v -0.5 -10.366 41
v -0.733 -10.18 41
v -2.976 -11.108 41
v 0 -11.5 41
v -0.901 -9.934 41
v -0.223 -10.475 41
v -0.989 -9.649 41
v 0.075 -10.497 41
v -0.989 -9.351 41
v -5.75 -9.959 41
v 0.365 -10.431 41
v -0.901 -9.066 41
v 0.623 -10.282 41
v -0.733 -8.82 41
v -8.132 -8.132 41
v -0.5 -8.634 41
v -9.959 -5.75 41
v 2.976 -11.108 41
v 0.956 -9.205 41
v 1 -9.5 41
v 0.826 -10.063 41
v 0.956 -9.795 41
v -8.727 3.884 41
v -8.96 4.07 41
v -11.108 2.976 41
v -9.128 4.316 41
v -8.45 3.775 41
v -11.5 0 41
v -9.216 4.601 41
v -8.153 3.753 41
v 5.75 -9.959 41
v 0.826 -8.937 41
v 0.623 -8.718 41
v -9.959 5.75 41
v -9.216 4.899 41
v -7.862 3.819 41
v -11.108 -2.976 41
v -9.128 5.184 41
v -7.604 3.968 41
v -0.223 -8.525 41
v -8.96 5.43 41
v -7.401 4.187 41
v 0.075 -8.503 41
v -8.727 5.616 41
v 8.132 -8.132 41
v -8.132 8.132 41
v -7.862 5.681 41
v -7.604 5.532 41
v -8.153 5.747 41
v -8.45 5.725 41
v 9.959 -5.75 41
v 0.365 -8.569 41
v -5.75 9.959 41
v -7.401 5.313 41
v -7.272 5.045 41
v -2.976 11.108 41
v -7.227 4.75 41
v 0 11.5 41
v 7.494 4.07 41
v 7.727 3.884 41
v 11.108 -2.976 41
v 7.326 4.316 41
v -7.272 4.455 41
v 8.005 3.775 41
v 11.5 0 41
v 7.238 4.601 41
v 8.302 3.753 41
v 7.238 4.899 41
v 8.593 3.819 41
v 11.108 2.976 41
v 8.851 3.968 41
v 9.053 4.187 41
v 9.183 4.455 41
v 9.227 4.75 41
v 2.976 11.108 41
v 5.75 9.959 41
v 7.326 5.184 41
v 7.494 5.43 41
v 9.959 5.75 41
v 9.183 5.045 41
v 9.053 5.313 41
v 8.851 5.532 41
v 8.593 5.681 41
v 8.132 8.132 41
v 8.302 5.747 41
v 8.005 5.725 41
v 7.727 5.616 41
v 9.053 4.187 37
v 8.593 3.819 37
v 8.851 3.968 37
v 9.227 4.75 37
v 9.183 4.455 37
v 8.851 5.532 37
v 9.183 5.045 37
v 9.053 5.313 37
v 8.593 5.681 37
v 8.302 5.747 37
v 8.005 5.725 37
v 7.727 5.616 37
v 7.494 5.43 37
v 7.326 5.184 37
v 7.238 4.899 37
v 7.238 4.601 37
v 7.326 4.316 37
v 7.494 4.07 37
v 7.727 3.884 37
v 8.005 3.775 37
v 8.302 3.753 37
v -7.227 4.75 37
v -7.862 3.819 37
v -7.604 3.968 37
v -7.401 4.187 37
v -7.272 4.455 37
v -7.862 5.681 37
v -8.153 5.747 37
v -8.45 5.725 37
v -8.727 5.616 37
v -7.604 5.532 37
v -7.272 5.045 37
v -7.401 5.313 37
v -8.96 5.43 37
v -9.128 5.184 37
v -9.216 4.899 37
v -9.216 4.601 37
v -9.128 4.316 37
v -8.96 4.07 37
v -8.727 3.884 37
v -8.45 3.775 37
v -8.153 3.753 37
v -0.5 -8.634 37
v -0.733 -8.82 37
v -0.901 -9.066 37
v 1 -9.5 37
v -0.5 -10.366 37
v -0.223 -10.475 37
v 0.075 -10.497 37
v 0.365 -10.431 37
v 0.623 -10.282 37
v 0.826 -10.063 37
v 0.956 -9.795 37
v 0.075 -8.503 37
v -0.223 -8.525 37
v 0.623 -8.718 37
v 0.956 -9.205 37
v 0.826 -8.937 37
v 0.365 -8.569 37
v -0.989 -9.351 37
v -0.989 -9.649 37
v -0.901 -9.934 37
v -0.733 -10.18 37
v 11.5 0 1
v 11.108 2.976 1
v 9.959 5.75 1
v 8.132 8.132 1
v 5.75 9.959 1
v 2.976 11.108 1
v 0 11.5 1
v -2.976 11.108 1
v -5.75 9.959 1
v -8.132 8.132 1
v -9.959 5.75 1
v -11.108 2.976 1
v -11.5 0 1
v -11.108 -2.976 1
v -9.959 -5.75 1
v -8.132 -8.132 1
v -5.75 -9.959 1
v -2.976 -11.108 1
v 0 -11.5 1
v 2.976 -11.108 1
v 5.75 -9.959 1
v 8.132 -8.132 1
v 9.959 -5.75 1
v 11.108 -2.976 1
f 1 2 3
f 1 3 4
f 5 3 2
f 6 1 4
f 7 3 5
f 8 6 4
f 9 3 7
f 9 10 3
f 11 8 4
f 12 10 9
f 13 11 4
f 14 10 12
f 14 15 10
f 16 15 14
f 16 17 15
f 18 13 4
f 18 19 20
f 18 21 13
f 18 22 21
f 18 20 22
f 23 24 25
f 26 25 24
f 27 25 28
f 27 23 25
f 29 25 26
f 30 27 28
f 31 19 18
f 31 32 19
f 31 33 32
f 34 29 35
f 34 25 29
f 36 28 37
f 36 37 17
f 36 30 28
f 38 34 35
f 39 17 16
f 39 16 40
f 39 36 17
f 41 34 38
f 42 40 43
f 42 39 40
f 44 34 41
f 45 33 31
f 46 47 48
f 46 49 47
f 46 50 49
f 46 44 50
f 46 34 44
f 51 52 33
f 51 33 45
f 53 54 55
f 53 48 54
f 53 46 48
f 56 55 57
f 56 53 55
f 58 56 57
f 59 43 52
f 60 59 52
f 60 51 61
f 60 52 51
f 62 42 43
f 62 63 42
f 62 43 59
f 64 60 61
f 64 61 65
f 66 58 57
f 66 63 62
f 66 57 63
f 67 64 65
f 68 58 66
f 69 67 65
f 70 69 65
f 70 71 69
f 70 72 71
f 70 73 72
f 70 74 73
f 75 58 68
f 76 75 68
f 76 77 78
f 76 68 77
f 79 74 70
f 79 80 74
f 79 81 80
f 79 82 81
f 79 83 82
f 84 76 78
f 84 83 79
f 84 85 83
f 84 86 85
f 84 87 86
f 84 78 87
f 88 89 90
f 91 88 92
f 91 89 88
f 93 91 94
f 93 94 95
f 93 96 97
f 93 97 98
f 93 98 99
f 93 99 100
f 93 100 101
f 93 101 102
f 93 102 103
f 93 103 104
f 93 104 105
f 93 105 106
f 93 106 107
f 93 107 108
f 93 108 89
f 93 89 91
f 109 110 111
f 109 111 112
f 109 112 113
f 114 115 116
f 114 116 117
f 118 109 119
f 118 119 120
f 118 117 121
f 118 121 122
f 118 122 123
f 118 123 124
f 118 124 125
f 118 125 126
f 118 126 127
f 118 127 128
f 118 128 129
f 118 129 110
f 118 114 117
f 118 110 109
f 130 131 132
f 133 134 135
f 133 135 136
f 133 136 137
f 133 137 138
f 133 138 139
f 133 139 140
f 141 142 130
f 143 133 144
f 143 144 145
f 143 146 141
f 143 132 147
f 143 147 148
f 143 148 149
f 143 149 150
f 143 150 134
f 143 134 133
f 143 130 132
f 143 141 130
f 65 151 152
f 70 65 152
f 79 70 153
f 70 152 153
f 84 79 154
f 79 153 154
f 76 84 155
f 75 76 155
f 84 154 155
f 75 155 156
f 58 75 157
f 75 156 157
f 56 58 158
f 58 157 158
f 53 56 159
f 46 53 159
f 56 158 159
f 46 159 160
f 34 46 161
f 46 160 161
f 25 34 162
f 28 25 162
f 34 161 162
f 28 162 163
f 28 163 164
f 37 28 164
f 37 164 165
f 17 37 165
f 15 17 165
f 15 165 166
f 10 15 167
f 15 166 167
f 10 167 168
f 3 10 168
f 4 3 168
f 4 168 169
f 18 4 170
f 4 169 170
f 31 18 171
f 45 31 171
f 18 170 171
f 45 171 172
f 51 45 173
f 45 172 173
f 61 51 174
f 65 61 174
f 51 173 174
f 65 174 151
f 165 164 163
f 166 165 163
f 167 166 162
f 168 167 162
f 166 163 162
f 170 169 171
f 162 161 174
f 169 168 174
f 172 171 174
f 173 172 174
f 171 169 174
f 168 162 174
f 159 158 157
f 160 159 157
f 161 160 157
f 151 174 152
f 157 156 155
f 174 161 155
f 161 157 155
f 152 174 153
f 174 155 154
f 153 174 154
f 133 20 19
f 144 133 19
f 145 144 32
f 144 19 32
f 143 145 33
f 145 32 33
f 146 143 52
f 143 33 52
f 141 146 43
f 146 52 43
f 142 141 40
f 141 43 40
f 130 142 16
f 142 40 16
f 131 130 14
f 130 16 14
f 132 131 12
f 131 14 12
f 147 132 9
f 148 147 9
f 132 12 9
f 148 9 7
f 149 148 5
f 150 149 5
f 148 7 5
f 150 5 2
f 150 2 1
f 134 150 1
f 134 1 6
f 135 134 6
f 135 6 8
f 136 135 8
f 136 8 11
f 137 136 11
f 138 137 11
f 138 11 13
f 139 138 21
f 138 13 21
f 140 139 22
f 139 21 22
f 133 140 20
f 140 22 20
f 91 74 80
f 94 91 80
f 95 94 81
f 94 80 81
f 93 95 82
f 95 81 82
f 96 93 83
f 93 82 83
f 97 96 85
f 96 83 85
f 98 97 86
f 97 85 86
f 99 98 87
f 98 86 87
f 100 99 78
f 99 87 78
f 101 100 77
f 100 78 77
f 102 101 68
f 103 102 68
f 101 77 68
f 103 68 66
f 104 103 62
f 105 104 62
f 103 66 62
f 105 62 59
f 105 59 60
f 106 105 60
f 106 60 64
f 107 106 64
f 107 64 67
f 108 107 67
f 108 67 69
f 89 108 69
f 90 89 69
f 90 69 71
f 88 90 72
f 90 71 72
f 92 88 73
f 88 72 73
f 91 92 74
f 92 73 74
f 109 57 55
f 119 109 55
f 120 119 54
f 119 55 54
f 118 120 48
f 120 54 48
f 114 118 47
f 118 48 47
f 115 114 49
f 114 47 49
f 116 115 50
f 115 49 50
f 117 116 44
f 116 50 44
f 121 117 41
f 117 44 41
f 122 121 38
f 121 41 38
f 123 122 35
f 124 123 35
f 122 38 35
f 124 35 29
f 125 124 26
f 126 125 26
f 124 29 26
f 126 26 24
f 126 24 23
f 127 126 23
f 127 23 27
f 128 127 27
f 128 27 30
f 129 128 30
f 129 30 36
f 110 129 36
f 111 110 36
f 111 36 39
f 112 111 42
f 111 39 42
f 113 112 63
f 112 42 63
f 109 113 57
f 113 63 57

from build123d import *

# Parameters (mm, degrees)
SKETCH001_R       = 23.34615
EXTRUDE_DEPTH     = 23
CYLINDER002_R     = 3
CYLINDER002_DEPTH = 15
CYLINDER001_R     = 7.5
CYLINDER001_DEPTH = 1
CYLINDER_R        = 11.5
CYLINDER_DEPTH    = 40
SKETCH_R          = 1
POCKET_DEPTH      = 4


with BuildPart() as clone_of_extrude:
    # Sketch001 → Extrude (new body)
    with BuildSketch(Plane.XY.offset(41)):
        Circle(SKETCH001_R)
    extrude(amount=EXTRUDE_DEPTH)


with BuildPart() as cylinder002:
    # Cylinder002 → Cylinder002 (new body)
    with BuildSketch(Plane.XY.offset(42)):
        Circle(CYLINDER002_R)
    extrude(amount=CYLINDER002_DEPTH)


with BuildPart() as cylinder001:
    # Cylinder001 → Cylinder001 (new body)
    with BuildSketch(Plane.XY.offset(41)):
        Circle(CYLINDER001_R)
    extrude(amount=CYLINDER001_DEPTH)


with BuildPart() as cut:
    # Cylinder → Cylinder (new body)
    with BuildSketch(Plane.XY.offset(1)):
        Circle(CYLINDER_R)
    extrude(amount=CYLINDER_DEPTH)

    # Fusion: union Cylinder002, Cylinder001
    add(cylinder002.part)
    add(cylinder001.part)

    # Sketch → Pocket (cut)
    with BuildSketch(Plane.XY.offset(41)):
        with Locations((8.227241, 4.75)):
            Circle(SKETCH_R)
        with Locations((-8.227241, 4.75)):
            Circle(SKETCH_R)
        with Locations((0, -9.5)):
            Circle(SKETCH_R)
    extrude(amount=-POCKET_DEPTH, mode=Mode.SUBTRACT)

    # Cut: cut Clone of Extrude
    add(clone_of_extrude.part, mode=Mode.SUBTRACT)


solid = cut.part
